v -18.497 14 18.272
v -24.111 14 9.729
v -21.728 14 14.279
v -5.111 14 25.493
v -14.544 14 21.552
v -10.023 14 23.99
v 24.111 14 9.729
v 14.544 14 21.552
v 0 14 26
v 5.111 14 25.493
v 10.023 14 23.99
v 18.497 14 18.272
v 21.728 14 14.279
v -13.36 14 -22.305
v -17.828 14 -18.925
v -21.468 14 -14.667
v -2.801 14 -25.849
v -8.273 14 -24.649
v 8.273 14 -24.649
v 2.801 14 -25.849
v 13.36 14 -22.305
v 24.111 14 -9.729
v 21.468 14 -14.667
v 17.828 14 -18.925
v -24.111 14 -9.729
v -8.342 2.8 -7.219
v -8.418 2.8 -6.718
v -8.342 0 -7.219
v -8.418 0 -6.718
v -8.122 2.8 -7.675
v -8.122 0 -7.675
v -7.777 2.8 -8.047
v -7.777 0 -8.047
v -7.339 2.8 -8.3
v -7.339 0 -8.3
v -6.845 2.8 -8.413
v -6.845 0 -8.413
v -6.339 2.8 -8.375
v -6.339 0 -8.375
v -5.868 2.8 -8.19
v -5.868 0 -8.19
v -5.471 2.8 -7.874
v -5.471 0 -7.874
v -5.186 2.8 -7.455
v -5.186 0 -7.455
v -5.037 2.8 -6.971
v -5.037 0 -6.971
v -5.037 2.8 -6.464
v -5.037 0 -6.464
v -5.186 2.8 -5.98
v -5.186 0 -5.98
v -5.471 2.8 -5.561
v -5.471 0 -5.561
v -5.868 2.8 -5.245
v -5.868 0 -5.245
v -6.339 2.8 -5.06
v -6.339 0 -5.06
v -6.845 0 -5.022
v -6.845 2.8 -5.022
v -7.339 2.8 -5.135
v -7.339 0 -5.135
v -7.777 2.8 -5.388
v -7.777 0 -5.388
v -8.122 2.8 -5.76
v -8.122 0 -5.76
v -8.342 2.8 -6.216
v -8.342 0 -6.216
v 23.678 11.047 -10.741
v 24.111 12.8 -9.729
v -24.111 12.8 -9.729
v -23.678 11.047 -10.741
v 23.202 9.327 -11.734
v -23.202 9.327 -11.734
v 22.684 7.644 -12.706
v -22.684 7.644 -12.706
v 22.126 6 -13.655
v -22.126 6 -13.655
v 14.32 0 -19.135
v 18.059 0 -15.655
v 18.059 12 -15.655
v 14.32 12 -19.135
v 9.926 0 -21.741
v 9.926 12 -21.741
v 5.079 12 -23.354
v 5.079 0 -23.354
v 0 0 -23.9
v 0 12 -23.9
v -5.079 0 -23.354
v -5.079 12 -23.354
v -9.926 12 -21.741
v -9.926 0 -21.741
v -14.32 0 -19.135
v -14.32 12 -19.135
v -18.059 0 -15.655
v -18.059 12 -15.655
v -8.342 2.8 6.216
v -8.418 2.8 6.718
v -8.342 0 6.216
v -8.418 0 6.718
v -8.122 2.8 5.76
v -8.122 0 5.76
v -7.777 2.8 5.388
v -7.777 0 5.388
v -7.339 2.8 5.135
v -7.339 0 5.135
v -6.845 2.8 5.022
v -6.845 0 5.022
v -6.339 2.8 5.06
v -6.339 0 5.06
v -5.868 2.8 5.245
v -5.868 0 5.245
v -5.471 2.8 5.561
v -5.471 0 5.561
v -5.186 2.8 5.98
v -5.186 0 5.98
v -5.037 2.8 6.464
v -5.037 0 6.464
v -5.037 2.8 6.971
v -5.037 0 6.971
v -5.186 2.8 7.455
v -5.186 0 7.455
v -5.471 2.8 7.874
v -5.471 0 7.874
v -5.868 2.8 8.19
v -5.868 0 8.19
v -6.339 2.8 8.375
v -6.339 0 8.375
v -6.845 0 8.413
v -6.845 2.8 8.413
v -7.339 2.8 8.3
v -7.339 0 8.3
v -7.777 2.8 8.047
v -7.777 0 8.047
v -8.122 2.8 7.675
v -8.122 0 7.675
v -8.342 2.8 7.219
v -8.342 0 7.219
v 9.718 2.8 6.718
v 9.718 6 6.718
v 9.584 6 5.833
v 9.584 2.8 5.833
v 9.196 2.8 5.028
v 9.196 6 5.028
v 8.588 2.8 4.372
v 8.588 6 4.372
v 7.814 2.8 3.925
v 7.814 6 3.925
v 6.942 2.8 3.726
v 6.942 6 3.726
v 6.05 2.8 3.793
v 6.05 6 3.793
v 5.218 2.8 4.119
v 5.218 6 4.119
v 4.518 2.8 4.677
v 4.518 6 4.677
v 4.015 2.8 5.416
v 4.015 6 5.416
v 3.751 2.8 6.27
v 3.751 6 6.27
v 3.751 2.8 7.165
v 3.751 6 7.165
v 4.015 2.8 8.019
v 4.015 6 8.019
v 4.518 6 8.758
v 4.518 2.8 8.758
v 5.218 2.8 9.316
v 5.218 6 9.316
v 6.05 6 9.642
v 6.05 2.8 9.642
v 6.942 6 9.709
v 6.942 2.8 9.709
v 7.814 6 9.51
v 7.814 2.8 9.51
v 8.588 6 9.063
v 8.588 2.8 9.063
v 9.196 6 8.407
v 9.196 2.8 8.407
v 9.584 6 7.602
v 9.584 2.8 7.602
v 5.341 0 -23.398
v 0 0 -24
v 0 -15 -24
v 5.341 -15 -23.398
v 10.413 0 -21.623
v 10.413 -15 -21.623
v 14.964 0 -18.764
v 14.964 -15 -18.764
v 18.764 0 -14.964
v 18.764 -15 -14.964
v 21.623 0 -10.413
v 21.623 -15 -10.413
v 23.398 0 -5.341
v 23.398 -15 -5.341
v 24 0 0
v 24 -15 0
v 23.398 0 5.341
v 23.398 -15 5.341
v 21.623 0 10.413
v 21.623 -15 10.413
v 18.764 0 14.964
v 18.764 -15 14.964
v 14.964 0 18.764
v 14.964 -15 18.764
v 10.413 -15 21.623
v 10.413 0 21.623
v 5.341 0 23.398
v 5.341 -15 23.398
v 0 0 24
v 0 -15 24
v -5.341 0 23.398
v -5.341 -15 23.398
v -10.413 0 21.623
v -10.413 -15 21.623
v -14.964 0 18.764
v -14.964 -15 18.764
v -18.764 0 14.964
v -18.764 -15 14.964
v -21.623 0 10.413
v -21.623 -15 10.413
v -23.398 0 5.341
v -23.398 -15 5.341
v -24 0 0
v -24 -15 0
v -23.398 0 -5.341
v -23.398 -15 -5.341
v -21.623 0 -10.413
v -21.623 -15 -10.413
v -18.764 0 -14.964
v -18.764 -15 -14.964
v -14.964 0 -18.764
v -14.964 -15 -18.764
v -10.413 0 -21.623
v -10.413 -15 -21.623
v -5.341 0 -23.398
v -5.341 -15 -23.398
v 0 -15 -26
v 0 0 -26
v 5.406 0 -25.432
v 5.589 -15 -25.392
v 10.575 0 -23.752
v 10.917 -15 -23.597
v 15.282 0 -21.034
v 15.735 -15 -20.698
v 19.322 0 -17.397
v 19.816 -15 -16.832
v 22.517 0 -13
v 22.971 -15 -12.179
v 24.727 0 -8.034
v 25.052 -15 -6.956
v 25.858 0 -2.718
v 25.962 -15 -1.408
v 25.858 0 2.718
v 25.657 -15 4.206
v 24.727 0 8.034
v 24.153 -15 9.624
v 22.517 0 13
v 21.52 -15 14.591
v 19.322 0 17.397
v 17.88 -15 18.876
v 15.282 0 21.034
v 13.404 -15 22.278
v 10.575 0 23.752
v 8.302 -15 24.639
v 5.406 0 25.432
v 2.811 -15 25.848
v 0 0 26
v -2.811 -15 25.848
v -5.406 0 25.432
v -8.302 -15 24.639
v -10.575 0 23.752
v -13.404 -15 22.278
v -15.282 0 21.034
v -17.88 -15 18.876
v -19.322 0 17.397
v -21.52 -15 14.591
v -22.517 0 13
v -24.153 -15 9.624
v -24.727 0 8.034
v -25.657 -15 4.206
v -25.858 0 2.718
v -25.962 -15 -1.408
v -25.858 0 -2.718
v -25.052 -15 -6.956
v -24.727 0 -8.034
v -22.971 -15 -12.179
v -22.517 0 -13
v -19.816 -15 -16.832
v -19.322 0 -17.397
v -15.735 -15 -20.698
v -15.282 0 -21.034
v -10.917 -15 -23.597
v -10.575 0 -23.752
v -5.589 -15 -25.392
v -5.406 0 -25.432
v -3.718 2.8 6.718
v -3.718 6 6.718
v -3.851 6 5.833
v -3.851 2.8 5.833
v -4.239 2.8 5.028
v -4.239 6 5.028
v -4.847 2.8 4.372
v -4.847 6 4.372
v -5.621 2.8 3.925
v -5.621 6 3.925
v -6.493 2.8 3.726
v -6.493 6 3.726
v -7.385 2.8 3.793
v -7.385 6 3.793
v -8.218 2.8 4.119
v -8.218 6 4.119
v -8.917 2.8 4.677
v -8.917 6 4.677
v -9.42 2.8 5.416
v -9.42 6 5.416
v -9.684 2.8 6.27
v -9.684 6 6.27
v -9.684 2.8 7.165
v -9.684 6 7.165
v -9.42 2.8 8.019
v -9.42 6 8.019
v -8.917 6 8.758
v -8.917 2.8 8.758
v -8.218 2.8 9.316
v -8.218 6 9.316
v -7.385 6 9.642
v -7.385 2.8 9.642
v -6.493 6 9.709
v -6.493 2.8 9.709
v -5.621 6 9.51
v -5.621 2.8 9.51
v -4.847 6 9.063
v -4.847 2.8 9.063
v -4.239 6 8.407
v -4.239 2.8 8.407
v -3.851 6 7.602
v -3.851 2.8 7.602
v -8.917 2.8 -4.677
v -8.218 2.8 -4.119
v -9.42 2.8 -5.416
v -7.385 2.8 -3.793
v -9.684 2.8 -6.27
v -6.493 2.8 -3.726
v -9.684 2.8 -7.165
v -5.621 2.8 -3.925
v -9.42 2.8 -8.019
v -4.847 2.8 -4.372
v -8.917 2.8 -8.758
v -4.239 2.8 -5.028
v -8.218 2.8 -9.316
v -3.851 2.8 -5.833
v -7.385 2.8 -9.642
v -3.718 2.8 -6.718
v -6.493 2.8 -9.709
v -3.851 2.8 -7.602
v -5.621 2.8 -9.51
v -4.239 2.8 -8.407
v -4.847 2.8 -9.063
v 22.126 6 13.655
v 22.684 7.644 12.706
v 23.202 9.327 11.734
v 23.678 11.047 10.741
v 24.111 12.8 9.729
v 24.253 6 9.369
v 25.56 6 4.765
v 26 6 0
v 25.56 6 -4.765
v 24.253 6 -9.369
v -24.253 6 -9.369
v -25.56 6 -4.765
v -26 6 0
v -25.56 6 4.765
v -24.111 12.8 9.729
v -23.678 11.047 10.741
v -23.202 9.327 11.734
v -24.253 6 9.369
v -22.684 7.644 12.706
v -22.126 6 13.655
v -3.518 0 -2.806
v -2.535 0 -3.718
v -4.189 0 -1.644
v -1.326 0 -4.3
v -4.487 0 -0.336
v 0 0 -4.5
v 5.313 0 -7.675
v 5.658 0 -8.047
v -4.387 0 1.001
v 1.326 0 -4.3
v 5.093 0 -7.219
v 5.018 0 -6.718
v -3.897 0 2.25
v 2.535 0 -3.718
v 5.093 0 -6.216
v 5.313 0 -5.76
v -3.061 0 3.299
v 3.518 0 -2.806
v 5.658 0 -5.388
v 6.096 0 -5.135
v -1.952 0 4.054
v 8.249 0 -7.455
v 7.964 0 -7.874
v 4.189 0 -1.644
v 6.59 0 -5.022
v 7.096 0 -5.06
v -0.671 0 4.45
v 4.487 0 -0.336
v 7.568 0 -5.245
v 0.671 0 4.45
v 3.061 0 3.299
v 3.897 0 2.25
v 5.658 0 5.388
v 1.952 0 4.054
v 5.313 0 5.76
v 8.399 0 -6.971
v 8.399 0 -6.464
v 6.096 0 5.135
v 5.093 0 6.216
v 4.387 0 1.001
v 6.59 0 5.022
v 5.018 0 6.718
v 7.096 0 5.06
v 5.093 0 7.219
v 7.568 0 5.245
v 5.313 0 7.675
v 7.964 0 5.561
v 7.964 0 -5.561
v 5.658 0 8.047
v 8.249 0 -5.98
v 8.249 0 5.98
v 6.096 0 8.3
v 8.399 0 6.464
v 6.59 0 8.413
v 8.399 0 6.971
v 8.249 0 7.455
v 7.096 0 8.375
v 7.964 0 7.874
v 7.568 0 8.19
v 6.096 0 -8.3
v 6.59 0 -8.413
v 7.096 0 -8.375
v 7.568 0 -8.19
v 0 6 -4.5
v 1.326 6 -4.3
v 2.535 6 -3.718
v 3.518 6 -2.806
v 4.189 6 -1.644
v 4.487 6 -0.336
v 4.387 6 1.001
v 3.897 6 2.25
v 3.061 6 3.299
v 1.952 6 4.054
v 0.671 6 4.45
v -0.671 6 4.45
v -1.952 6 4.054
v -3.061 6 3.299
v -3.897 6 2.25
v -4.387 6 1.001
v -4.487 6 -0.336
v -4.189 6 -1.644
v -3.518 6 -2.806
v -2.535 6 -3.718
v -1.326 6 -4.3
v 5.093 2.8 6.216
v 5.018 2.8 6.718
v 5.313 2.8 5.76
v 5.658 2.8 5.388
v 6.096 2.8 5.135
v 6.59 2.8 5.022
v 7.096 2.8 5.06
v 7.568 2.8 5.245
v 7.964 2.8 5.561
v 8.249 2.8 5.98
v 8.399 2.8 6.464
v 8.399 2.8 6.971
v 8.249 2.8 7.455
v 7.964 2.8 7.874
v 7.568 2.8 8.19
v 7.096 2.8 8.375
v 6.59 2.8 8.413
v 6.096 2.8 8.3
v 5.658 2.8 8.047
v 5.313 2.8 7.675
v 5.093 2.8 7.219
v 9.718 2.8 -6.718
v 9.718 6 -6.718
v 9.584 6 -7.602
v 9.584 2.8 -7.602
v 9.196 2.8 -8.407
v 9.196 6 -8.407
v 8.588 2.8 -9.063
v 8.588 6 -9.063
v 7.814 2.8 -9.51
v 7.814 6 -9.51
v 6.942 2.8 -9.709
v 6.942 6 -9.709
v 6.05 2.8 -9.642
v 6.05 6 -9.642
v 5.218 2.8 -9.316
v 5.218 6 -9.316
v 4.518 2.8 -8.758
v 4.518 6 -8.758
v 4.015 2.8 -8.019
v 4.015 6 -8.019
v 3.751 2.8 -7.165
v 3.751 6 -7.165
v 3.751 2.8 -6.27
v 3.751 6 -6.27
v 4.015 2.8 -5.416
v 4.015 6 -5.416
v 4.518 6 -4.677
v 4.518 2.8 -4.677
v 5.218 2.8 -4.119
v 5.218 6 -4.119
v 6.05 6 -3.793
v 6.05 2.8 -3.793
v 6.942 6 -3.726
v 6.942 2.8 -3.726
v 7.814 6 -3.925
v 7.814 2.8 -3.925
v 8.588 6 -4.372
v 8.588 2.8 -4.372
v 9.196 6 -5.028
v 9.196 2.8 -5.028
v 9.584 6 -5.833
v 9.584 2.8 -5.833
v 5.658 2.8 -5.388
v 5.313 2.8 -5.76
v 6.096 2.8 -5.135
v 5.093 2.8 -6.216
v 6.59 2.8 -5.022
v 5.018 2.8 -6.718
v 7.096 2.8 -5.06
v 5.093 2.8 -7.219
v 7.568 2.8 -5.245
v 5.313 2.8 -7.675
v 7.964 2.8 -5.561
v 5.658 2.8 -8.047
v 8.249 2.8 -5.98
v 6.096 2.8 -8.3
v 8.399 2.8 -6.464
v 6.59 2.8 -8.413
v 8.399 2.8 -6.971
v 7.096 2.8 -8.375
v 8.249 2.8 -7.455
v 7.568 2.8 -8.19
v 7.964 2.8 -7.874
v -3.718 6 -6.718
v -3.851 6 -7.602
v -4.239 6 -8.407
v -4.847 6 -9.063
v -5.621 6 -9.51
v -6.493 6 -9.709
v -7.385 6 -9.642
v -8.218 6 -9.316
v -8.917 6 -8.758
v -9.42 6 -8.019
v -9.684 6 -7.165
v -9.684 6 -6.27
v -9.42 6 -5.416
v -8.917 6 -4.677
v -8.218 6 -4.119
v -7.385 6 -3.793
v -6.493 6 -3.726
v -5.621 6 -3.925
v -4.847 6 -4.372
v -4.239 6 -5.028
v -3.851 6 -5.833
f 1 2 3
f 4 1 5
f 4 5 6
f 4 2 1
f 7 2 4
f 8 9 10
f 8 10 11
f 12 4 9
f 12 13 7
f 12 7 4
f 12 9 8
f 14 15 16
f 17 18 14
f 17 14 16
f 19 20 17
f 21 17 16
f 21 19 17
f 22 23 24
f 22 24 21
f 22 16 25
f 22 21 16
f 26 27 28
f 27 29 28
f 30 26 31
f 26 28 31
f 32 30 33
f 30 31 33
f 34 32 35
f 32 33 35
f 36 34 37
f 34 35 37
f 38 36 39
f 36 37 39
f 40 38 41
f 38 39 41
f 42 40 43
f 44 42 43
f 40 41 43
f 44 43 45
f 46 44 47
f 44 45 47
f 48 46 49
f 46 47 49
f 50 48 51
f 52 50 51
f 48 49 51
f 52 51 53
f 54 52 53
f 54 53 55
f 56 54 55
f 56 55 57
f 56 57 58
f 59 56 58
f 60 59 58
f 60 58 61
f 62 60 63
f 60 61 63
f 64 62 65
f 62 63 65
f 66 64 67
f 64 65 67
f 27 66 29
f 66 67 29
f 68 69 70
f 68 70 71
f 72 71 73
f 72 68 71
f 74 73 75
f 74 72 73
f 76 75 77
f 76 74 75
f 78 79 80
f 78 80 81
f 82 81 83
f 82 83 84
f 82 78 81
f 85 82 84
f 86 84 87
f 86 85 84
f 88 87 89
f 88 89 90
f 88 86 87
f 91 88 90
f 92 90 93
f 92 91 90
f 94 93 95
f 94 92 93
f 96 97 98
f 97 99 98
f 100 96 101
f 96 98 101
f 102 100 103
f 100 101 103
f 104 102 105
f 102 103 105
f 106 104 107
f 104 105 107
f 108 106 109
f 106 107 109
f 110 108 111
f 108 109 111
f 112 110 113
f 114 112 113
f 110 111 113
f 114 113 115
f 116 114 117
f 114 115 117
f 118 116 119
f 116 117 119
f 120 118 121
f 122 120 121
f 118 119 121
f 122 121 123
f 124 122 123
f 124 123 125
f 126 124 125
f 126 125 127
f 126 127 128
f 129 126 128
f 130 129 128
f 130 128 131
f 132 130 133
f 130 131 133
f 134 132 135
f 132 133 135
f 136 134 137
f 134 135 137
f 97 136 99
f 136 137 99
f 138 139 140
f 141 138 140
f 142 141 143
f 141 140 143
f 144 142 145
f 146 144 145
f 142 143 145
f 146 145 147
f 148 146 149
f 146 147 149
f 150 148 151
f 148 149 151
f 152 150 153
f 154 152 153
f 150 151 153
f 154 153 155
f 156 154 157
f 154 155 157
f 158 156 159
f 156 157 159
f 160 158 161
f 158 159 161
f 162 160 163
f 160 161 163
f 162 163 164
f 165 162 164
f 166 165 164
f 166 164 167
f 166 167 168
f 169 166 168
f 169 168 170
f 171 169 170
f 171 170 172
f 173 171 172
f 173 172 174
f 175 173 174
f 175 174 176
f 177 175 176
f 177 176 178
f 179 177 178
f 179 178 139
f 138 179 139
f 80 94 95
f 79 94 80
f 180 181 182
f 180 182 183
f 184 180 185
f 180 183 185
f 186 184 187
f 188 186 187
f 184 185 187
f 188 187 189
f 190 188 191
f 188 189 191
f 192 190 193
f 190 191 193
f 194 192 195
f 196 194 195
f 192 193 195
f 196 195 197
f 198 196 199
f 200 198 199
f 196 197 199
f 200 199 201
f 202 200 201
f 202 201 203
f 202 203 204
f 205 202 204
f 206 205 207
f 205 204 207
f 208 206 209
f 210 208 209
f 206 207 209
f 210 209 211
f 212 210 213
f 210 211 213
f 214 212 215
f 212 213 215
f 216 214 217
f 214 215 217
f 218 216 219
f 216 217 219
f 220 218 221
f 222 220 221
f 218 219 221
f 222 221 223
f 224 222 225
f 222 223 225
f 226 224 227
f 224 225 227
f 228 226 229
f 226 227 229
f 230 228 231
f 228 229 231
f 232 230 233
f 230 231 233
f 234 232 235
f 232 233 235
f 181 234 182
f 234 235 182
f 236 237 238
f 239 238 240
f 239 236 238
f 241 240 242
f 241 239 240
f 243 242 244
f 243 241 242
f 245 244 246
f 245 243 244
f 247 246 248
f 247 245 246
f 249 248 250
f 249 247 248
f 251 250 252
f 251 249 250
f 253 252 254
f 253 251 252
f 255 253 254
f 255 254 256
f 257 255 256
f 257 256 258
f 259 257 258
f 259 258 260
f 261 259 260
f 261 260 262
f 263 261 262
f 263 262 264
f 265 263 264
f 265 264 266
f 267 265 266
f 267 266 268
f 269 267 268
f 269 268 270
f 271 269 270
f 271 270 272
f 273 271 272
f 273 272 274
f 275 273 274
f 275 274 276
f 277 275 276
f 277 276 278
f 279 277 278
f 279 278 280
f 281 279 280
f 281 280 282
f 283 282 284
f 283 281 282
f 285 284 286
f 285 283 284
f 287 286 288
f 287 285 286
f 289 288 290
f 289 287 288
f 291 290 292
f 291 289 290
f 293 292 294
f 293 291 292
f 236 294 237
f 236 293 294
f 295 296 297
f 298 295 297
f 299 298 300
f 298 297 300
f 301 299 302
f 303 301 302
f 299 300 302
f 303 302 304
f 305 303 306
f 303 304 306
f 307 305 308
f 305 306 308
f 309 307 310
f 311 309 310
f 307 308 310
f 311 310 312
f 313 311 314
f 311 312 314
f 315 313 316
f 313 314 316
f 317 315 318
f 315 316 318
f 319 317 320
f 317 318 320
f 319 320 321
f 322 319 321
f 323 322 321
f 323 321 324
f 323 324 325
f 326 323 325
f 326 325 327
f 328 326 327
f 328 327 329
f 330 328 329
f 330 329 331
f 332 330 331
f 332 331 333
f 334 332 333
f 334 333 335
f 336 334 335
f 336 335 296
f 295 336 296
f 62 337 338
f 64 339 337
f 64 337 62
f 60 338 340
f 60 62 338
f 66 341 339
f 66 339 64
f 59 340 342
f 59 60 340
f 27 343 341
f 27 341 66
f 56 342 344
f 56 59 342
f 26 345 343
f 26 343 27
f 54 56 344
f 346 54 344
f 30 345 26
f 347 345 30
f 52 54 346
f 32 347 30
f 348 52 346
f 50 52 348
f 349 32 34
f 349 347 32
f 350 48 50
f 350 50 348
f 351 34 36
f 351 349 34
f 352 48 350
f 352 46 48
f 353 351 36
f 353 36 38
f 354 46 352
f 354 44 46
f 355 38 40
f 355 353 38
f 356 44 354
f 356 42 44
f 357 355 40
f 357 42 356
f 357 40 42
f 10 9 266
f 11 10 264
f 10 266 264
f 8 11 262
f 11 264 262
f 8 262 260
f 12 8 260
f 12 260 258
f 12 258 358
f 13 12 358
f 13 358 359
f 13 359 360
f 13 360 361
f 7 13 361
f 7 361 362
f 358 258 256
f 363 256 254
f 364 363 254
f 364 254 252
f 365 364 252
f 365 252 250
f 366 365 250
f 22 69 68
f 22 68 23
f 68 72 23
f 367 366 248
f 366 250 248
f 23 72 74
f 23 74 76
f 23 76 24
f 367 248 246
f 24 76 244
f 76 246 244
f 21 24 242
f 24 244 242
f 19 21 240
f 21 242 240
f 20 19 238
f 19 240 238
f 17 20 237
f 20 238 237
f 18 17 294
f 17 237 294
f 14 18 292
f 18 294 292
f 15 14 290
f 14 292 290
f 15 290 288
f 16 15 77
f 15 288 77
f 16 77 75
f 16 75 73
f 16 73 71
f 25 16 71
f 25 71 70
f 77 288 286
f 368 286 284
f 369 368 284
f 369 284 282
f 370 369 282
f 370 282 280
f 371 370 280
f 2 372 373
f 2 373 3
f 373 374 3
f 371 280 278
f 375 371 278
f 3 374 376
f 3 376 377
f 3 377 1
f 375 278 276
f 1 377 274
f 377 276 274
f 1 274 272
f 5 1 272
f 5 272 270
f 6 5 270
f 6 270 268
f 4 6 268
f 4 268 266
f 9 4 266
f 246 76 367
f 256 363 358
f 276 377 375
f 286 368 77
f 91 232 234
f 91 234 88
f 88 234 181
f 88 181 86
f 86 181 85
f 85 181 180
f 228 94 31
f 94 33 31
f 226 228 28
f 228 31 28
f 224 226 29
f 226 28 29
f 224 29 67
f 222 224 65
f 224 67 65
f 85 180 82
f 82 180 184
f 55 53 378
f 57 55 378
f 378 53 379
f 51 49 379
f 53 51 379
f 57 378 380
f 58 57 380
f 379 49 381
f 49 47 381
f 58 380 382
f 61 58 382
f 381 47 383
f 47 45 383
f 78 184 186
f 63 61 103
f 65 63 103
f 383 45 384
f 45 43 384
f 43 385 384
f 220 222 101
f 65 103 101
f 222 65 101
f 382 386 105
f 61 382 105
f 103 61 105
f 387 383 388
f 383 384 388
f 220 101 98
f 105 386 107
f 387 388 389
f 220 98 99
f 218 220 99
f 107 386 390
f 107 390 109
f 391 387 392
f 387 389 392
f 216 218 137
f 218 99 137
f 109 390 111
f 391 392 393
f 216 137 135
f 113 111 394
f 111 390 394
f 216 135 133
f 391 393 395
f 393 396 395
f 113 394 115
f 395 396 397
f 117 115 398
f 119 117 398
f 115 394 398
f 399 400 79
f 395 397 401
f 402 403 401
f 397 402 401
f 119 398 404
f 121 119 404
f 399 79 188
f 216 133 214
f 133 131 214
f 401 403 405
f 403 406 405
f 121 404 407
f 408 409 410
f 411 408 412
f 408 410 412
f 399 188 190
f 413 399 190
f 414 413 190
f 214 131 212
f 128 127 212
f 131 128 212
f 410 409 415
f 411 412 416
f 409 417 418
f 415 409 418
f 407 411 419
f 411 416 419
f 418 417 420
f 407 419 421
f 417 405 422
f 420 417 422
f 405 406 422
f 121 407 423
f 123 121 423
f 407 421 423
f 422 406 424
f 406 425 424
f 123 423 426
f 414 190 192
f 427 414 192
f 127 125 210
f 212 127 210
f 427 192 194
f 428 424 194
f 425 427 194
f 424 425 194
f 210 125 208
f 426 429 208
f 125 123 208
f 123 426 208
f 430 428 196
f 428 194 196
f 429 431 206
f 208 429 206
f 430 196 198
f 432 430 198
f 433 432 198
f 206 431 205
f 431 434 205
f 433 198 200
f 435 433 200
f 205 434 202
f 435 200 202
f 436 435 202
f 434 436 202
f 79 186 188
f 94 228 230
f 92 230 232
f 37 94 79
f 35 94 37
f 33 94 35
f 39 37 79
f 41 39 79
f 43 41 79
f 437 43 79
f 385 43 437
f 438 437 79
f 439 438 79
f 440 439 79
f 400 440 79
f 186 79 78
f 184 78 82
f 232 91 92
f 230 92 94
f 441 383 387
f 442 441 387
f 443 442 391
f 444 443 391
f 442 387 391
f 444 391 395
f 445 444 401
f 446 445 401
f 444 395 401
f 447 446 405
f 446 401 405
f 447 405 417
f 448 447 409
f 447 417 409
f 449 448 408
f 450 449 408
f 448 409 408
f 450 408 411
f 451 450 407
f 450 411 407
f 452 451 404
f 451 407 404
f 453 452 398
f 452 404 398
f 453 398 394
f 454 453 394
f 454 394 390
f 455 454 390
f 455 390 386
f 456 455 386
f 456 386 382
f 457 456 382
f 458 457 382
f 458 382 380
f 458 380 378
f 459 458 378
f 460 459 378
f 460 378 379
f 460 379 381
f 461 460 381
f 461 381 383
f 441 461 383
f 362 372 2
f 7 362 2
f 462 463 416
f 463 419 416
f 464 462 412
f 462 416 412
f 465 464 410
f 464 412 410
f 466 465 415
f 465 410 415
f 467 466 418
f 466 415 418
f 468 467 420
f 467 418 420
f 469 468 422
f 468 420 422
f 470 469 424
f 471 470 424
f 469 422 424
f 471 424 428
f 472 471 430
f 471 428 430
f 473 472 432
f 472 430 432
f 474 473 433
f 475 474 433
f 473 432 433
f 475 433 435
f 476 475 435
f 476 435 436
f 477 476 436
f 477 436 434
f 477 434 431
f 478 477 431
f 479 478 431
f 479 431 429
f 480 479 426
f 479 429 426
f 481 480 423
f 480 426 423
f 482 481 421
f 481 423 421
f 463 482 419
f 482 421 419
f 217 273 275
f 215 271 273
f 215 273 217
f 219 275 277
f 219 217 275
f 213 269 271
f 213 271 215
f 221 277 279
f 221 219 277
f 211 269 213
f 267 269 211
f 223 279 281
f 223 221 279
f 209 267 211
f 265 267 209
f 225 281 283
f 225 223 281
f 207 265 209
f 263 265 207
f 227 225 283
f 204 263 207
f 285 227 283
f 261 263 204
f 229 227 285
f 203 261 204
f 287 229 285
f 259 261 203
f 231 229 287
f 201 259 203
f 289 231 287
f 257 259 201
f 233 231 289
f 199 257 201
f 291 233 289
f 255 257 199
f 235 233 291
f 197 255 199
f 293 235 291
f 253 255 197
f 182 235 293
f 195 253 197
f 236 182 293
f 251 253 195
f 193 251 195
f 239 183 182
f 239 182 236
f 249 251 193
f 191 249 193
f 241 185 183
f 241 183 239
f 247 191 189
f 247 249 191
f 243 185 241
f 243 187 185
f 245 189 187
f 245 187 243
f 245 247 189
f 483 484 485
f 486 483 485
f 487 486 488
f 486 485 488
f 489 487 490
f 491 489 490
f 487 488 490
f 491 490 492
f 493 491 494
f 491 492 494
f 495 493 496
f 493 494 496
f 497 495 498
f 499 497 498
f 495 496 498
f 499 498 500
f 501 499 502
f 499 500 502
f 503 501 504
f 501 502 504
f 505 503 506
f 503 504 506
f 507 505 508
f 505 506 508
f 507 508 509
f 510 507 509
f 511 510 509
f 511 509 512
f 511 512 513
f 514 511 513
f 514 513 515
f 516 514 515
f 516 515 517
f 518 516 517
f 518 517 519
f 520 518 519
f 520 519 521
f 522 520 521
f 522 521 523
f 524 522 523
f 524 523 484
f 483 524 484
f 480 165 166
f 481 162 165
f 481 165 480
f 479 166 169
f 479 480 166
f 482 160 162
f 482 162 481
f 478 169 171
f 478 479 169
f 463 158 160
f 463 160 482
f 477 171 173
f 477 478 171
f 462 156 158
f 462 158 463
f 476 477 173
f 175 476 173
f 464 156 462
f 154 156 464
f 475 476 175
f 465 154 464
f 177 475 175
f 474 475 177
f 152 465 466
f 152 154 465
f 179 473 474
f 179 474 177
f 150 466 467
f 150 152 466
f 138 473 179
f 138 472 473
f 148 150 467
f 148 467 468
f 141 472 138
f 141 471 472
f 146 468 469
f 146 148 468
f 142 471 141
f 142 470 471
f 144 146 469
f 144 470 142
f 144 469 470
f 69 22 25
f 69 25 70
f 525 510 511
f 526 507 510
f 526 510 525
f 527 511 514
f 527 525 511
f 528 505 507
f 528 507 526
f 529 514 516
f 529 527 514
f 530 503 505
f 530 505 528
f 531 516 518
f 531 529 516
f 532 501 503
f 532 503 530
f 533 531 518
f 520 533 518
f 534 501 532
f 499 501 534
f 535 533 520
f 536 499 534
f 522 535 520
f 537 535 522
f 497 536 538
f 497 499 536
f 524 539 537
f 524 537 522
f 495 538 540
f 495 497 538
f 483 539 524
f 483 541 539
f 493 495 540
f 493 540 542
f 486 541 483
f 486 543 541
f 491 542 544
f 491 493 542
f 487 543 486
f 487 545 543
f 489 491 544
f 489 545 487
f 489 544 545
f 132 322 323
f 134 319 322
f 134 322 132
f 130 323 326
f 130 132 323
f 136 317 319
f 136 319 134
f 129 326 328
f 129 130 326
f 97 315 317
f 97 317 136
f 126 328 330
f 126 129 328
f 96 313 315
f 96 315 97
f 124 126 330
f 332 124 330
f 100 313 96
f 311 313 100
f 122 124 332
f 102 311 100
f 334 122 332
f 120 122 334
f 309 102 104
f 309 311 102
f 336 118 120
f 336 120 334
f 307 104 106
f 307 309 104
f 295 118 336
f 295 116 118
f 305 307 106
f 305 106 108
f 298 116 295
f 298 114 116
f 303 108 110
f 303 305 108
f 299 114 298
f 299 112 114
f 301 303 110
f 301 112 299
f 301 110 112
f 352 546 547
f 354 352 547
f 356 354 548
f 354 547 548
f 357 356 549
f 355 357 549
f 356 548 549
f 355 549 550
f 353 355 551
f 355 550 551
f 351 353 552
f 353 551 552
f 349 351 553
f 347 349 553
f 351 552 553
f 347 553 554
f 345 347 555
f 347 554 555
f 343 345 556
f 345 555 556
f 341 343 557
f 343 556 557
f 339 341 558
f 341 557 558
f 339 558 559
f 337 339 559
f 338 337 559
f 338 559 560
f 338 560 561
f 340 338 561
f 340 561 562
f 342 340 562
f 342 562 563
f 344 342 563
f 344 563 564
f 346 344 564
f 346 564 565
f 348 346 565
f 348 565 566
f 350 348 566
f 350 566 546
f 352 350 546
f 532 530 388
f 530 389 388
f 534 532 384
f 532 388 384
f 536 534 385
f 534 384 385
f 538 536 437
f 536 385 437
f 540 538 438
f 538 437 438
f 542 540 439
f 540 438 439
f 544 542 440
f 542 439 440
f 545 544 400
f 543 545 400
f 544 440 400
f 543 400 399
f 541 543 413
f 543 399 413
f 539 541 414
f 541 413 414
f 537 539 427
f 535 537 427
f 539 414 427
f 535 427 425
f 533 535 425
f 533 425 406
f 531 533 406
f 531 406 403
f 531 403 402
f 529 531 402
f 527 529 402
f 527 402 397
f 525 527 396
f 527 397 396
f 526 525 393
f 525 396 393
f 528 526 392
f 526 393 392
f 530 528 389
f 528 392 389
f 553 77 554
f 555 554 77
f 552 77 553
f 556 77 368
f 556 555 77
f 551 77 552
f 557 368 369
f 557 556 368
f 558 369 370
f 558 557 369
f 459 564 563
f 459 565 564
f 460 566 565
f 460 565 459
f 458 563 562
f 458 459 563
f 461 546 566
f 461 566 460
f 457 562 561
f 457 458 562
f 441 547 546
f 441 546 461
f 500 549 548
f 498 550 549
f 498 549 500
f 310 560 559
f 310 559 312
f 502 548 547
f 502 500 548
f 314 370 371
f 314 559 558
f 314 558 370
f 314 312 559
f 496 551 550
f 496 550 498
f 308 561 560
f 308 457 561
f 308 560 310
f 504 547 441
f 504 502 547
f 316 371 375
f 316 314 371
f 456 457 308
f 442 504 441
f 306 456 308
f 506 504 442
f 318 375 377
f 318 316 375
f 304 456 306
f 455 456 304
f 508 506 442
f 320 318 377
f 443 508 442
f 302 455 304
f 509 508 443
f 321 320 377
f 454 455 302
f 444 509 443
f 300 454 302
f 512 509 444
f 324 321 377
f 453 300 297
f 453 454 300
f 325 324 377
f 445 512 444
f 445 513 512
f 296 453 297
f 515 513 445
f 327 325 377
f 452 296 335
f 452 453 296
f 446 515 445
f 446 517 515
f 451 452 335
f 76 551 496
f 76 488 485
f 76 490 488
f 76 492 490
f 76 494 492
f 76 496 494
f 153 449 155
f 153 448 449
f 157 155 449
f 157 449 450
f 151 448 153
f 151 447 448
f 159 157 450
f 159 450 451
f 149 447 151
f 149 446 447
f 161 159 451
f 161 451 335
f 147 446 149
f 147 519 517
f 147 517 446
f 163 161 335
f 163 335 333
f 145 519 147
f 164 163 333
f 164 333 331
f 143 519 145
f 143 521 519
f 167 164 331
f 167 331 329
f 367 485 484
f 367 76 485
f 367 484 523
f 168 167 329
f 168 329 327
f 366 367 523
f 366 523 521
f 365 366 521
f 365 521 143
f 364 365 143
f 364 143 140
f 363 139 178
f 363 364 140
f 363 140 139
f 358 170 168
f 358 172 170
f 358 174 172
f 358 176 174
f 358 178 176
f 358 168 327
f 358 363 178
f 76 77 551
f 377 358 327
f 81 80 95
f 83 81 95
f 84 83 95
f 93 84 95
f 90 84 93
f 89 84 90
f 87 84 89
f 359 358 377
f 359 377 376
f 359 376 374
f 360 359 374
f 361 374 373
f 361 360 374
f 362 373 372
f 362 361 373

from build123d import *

# Parameters (mm, degrees)
SKETCH_1_R                  = 26
EXTRUDE_1_DEPTH             = 14
CUT_EXTRUDE_1_DEPTH         = 30
SKETCH_4_R                  = 4.5
CUT_EXTRUDE_2_DEPTH         = 40.344631146
CUT_EXTRUDE_3_DEPTH         = 12
HOLE_WIZARD_M31_D           = 3.4
HOLE_WIZARD_M31_CBORE_D     = 6
HOLE_WIZARD_M31_CBORE_DEPTH = 3.2
EXTRUDE_START               = 15
SKETCH_12_R                 = 26
SKETCH_12_R_2               = 24
EXTRUDE_2_DEPTH             = 15


with BuildPart() as part:
    # Эскиз1 → Бобышка-Вытянуть1 (new body)
    with BuildSketch(Plane(origin=(0, 0, 0), x_dir=(1, 0, 0), z_dir=(0, 1, 0))):
        with Locations(Location((0, 0, 0), (0, 0, 270))):
            Circle(SKETCH_1_R)
    extrude(amount=EXTRUDE_1_DEPTH)

    # Эскиз2 → Вырез-Вытянуть1 (cut, symmetric)
    with BuildSketch(Plane(origin=(0, 0, 0), x_dir=(0, 0, -1), z_dir=(1, 0, 0))):
        Polygon((13.654700538, 6), (-13.654700538, 6), (-9.728718708, 12.8), (-9.728718708, 14), (9.728718708, 14), (9.728718708, 12.8), align=None)
    extrude(amount=CUT_EXTRUDE_1_DEPTH, both=True, mode=Mode.SUBTRACT)

    # Эскиз4 → Вырез-Вытянуть2 (cut, through all)
    with BuildSketch(Plane.XZ):
        with Locations(Location((0, 0, 0), (0, 0, 270))):
            Circle(SKETCH_4_R)
    extrude(amount=-CUT_EXTRUDE_2_DEPTH, mode=Mode.SUBTRACT)

    # Эскиз5 → Вырез-Вытянуть3 (cut)
    with BuildSketch(Plane.XZ):
        with BuildLine():
            Line((-18.05935633, -15.654700538), (18.05935633, -15.654700538))
            ThreePointArc((18.05935633, -15.654700538), (0, -23.9), (-18.05935633, -15.654700538))
        make_face()
    extrude(amount=-CUT_EXTRUDE_3_DEPTH, mode=Mode.SUBTRACT)

    # Цековка для винта с внутренним шестигранником M31 (through all)
    with Locations(Plane(origin=(0, 6, 0), x_dir=(1, 0, 0), z_dir=(0, 1, 0))):
        with Locations((-6.717514421, 6.717514421), (6.717514421, 6.717514421), (6.717514421, -6.717514421), (-6.717514421, -6.717514421)):
            CounterBoreHole(HOLE_WIZARD_M31_D / 2, HOLE_WIZARD_M31_CBORE_D / 2, HOLE_WIZARD_M31_CBORE_DEPTH)

    # Эскиз12 → Бобышка-Вытянуть2 (add)
    with BuildSketch(Plane.XZ.offset(EXTRUDE_START)):
        with Locations(Location((0, 0, 0), (0, 0, 270))):
            Circle(SKETCH_12_R)
        with Locations(Location((0, 0, 0), (0, 0, 270))):
            Circle(SKETCH_12_R_2, mode=Mode.SUBTRACT)
    extrude(amount=-EXTRUDE_2_DEPTH)


solid = part.part
